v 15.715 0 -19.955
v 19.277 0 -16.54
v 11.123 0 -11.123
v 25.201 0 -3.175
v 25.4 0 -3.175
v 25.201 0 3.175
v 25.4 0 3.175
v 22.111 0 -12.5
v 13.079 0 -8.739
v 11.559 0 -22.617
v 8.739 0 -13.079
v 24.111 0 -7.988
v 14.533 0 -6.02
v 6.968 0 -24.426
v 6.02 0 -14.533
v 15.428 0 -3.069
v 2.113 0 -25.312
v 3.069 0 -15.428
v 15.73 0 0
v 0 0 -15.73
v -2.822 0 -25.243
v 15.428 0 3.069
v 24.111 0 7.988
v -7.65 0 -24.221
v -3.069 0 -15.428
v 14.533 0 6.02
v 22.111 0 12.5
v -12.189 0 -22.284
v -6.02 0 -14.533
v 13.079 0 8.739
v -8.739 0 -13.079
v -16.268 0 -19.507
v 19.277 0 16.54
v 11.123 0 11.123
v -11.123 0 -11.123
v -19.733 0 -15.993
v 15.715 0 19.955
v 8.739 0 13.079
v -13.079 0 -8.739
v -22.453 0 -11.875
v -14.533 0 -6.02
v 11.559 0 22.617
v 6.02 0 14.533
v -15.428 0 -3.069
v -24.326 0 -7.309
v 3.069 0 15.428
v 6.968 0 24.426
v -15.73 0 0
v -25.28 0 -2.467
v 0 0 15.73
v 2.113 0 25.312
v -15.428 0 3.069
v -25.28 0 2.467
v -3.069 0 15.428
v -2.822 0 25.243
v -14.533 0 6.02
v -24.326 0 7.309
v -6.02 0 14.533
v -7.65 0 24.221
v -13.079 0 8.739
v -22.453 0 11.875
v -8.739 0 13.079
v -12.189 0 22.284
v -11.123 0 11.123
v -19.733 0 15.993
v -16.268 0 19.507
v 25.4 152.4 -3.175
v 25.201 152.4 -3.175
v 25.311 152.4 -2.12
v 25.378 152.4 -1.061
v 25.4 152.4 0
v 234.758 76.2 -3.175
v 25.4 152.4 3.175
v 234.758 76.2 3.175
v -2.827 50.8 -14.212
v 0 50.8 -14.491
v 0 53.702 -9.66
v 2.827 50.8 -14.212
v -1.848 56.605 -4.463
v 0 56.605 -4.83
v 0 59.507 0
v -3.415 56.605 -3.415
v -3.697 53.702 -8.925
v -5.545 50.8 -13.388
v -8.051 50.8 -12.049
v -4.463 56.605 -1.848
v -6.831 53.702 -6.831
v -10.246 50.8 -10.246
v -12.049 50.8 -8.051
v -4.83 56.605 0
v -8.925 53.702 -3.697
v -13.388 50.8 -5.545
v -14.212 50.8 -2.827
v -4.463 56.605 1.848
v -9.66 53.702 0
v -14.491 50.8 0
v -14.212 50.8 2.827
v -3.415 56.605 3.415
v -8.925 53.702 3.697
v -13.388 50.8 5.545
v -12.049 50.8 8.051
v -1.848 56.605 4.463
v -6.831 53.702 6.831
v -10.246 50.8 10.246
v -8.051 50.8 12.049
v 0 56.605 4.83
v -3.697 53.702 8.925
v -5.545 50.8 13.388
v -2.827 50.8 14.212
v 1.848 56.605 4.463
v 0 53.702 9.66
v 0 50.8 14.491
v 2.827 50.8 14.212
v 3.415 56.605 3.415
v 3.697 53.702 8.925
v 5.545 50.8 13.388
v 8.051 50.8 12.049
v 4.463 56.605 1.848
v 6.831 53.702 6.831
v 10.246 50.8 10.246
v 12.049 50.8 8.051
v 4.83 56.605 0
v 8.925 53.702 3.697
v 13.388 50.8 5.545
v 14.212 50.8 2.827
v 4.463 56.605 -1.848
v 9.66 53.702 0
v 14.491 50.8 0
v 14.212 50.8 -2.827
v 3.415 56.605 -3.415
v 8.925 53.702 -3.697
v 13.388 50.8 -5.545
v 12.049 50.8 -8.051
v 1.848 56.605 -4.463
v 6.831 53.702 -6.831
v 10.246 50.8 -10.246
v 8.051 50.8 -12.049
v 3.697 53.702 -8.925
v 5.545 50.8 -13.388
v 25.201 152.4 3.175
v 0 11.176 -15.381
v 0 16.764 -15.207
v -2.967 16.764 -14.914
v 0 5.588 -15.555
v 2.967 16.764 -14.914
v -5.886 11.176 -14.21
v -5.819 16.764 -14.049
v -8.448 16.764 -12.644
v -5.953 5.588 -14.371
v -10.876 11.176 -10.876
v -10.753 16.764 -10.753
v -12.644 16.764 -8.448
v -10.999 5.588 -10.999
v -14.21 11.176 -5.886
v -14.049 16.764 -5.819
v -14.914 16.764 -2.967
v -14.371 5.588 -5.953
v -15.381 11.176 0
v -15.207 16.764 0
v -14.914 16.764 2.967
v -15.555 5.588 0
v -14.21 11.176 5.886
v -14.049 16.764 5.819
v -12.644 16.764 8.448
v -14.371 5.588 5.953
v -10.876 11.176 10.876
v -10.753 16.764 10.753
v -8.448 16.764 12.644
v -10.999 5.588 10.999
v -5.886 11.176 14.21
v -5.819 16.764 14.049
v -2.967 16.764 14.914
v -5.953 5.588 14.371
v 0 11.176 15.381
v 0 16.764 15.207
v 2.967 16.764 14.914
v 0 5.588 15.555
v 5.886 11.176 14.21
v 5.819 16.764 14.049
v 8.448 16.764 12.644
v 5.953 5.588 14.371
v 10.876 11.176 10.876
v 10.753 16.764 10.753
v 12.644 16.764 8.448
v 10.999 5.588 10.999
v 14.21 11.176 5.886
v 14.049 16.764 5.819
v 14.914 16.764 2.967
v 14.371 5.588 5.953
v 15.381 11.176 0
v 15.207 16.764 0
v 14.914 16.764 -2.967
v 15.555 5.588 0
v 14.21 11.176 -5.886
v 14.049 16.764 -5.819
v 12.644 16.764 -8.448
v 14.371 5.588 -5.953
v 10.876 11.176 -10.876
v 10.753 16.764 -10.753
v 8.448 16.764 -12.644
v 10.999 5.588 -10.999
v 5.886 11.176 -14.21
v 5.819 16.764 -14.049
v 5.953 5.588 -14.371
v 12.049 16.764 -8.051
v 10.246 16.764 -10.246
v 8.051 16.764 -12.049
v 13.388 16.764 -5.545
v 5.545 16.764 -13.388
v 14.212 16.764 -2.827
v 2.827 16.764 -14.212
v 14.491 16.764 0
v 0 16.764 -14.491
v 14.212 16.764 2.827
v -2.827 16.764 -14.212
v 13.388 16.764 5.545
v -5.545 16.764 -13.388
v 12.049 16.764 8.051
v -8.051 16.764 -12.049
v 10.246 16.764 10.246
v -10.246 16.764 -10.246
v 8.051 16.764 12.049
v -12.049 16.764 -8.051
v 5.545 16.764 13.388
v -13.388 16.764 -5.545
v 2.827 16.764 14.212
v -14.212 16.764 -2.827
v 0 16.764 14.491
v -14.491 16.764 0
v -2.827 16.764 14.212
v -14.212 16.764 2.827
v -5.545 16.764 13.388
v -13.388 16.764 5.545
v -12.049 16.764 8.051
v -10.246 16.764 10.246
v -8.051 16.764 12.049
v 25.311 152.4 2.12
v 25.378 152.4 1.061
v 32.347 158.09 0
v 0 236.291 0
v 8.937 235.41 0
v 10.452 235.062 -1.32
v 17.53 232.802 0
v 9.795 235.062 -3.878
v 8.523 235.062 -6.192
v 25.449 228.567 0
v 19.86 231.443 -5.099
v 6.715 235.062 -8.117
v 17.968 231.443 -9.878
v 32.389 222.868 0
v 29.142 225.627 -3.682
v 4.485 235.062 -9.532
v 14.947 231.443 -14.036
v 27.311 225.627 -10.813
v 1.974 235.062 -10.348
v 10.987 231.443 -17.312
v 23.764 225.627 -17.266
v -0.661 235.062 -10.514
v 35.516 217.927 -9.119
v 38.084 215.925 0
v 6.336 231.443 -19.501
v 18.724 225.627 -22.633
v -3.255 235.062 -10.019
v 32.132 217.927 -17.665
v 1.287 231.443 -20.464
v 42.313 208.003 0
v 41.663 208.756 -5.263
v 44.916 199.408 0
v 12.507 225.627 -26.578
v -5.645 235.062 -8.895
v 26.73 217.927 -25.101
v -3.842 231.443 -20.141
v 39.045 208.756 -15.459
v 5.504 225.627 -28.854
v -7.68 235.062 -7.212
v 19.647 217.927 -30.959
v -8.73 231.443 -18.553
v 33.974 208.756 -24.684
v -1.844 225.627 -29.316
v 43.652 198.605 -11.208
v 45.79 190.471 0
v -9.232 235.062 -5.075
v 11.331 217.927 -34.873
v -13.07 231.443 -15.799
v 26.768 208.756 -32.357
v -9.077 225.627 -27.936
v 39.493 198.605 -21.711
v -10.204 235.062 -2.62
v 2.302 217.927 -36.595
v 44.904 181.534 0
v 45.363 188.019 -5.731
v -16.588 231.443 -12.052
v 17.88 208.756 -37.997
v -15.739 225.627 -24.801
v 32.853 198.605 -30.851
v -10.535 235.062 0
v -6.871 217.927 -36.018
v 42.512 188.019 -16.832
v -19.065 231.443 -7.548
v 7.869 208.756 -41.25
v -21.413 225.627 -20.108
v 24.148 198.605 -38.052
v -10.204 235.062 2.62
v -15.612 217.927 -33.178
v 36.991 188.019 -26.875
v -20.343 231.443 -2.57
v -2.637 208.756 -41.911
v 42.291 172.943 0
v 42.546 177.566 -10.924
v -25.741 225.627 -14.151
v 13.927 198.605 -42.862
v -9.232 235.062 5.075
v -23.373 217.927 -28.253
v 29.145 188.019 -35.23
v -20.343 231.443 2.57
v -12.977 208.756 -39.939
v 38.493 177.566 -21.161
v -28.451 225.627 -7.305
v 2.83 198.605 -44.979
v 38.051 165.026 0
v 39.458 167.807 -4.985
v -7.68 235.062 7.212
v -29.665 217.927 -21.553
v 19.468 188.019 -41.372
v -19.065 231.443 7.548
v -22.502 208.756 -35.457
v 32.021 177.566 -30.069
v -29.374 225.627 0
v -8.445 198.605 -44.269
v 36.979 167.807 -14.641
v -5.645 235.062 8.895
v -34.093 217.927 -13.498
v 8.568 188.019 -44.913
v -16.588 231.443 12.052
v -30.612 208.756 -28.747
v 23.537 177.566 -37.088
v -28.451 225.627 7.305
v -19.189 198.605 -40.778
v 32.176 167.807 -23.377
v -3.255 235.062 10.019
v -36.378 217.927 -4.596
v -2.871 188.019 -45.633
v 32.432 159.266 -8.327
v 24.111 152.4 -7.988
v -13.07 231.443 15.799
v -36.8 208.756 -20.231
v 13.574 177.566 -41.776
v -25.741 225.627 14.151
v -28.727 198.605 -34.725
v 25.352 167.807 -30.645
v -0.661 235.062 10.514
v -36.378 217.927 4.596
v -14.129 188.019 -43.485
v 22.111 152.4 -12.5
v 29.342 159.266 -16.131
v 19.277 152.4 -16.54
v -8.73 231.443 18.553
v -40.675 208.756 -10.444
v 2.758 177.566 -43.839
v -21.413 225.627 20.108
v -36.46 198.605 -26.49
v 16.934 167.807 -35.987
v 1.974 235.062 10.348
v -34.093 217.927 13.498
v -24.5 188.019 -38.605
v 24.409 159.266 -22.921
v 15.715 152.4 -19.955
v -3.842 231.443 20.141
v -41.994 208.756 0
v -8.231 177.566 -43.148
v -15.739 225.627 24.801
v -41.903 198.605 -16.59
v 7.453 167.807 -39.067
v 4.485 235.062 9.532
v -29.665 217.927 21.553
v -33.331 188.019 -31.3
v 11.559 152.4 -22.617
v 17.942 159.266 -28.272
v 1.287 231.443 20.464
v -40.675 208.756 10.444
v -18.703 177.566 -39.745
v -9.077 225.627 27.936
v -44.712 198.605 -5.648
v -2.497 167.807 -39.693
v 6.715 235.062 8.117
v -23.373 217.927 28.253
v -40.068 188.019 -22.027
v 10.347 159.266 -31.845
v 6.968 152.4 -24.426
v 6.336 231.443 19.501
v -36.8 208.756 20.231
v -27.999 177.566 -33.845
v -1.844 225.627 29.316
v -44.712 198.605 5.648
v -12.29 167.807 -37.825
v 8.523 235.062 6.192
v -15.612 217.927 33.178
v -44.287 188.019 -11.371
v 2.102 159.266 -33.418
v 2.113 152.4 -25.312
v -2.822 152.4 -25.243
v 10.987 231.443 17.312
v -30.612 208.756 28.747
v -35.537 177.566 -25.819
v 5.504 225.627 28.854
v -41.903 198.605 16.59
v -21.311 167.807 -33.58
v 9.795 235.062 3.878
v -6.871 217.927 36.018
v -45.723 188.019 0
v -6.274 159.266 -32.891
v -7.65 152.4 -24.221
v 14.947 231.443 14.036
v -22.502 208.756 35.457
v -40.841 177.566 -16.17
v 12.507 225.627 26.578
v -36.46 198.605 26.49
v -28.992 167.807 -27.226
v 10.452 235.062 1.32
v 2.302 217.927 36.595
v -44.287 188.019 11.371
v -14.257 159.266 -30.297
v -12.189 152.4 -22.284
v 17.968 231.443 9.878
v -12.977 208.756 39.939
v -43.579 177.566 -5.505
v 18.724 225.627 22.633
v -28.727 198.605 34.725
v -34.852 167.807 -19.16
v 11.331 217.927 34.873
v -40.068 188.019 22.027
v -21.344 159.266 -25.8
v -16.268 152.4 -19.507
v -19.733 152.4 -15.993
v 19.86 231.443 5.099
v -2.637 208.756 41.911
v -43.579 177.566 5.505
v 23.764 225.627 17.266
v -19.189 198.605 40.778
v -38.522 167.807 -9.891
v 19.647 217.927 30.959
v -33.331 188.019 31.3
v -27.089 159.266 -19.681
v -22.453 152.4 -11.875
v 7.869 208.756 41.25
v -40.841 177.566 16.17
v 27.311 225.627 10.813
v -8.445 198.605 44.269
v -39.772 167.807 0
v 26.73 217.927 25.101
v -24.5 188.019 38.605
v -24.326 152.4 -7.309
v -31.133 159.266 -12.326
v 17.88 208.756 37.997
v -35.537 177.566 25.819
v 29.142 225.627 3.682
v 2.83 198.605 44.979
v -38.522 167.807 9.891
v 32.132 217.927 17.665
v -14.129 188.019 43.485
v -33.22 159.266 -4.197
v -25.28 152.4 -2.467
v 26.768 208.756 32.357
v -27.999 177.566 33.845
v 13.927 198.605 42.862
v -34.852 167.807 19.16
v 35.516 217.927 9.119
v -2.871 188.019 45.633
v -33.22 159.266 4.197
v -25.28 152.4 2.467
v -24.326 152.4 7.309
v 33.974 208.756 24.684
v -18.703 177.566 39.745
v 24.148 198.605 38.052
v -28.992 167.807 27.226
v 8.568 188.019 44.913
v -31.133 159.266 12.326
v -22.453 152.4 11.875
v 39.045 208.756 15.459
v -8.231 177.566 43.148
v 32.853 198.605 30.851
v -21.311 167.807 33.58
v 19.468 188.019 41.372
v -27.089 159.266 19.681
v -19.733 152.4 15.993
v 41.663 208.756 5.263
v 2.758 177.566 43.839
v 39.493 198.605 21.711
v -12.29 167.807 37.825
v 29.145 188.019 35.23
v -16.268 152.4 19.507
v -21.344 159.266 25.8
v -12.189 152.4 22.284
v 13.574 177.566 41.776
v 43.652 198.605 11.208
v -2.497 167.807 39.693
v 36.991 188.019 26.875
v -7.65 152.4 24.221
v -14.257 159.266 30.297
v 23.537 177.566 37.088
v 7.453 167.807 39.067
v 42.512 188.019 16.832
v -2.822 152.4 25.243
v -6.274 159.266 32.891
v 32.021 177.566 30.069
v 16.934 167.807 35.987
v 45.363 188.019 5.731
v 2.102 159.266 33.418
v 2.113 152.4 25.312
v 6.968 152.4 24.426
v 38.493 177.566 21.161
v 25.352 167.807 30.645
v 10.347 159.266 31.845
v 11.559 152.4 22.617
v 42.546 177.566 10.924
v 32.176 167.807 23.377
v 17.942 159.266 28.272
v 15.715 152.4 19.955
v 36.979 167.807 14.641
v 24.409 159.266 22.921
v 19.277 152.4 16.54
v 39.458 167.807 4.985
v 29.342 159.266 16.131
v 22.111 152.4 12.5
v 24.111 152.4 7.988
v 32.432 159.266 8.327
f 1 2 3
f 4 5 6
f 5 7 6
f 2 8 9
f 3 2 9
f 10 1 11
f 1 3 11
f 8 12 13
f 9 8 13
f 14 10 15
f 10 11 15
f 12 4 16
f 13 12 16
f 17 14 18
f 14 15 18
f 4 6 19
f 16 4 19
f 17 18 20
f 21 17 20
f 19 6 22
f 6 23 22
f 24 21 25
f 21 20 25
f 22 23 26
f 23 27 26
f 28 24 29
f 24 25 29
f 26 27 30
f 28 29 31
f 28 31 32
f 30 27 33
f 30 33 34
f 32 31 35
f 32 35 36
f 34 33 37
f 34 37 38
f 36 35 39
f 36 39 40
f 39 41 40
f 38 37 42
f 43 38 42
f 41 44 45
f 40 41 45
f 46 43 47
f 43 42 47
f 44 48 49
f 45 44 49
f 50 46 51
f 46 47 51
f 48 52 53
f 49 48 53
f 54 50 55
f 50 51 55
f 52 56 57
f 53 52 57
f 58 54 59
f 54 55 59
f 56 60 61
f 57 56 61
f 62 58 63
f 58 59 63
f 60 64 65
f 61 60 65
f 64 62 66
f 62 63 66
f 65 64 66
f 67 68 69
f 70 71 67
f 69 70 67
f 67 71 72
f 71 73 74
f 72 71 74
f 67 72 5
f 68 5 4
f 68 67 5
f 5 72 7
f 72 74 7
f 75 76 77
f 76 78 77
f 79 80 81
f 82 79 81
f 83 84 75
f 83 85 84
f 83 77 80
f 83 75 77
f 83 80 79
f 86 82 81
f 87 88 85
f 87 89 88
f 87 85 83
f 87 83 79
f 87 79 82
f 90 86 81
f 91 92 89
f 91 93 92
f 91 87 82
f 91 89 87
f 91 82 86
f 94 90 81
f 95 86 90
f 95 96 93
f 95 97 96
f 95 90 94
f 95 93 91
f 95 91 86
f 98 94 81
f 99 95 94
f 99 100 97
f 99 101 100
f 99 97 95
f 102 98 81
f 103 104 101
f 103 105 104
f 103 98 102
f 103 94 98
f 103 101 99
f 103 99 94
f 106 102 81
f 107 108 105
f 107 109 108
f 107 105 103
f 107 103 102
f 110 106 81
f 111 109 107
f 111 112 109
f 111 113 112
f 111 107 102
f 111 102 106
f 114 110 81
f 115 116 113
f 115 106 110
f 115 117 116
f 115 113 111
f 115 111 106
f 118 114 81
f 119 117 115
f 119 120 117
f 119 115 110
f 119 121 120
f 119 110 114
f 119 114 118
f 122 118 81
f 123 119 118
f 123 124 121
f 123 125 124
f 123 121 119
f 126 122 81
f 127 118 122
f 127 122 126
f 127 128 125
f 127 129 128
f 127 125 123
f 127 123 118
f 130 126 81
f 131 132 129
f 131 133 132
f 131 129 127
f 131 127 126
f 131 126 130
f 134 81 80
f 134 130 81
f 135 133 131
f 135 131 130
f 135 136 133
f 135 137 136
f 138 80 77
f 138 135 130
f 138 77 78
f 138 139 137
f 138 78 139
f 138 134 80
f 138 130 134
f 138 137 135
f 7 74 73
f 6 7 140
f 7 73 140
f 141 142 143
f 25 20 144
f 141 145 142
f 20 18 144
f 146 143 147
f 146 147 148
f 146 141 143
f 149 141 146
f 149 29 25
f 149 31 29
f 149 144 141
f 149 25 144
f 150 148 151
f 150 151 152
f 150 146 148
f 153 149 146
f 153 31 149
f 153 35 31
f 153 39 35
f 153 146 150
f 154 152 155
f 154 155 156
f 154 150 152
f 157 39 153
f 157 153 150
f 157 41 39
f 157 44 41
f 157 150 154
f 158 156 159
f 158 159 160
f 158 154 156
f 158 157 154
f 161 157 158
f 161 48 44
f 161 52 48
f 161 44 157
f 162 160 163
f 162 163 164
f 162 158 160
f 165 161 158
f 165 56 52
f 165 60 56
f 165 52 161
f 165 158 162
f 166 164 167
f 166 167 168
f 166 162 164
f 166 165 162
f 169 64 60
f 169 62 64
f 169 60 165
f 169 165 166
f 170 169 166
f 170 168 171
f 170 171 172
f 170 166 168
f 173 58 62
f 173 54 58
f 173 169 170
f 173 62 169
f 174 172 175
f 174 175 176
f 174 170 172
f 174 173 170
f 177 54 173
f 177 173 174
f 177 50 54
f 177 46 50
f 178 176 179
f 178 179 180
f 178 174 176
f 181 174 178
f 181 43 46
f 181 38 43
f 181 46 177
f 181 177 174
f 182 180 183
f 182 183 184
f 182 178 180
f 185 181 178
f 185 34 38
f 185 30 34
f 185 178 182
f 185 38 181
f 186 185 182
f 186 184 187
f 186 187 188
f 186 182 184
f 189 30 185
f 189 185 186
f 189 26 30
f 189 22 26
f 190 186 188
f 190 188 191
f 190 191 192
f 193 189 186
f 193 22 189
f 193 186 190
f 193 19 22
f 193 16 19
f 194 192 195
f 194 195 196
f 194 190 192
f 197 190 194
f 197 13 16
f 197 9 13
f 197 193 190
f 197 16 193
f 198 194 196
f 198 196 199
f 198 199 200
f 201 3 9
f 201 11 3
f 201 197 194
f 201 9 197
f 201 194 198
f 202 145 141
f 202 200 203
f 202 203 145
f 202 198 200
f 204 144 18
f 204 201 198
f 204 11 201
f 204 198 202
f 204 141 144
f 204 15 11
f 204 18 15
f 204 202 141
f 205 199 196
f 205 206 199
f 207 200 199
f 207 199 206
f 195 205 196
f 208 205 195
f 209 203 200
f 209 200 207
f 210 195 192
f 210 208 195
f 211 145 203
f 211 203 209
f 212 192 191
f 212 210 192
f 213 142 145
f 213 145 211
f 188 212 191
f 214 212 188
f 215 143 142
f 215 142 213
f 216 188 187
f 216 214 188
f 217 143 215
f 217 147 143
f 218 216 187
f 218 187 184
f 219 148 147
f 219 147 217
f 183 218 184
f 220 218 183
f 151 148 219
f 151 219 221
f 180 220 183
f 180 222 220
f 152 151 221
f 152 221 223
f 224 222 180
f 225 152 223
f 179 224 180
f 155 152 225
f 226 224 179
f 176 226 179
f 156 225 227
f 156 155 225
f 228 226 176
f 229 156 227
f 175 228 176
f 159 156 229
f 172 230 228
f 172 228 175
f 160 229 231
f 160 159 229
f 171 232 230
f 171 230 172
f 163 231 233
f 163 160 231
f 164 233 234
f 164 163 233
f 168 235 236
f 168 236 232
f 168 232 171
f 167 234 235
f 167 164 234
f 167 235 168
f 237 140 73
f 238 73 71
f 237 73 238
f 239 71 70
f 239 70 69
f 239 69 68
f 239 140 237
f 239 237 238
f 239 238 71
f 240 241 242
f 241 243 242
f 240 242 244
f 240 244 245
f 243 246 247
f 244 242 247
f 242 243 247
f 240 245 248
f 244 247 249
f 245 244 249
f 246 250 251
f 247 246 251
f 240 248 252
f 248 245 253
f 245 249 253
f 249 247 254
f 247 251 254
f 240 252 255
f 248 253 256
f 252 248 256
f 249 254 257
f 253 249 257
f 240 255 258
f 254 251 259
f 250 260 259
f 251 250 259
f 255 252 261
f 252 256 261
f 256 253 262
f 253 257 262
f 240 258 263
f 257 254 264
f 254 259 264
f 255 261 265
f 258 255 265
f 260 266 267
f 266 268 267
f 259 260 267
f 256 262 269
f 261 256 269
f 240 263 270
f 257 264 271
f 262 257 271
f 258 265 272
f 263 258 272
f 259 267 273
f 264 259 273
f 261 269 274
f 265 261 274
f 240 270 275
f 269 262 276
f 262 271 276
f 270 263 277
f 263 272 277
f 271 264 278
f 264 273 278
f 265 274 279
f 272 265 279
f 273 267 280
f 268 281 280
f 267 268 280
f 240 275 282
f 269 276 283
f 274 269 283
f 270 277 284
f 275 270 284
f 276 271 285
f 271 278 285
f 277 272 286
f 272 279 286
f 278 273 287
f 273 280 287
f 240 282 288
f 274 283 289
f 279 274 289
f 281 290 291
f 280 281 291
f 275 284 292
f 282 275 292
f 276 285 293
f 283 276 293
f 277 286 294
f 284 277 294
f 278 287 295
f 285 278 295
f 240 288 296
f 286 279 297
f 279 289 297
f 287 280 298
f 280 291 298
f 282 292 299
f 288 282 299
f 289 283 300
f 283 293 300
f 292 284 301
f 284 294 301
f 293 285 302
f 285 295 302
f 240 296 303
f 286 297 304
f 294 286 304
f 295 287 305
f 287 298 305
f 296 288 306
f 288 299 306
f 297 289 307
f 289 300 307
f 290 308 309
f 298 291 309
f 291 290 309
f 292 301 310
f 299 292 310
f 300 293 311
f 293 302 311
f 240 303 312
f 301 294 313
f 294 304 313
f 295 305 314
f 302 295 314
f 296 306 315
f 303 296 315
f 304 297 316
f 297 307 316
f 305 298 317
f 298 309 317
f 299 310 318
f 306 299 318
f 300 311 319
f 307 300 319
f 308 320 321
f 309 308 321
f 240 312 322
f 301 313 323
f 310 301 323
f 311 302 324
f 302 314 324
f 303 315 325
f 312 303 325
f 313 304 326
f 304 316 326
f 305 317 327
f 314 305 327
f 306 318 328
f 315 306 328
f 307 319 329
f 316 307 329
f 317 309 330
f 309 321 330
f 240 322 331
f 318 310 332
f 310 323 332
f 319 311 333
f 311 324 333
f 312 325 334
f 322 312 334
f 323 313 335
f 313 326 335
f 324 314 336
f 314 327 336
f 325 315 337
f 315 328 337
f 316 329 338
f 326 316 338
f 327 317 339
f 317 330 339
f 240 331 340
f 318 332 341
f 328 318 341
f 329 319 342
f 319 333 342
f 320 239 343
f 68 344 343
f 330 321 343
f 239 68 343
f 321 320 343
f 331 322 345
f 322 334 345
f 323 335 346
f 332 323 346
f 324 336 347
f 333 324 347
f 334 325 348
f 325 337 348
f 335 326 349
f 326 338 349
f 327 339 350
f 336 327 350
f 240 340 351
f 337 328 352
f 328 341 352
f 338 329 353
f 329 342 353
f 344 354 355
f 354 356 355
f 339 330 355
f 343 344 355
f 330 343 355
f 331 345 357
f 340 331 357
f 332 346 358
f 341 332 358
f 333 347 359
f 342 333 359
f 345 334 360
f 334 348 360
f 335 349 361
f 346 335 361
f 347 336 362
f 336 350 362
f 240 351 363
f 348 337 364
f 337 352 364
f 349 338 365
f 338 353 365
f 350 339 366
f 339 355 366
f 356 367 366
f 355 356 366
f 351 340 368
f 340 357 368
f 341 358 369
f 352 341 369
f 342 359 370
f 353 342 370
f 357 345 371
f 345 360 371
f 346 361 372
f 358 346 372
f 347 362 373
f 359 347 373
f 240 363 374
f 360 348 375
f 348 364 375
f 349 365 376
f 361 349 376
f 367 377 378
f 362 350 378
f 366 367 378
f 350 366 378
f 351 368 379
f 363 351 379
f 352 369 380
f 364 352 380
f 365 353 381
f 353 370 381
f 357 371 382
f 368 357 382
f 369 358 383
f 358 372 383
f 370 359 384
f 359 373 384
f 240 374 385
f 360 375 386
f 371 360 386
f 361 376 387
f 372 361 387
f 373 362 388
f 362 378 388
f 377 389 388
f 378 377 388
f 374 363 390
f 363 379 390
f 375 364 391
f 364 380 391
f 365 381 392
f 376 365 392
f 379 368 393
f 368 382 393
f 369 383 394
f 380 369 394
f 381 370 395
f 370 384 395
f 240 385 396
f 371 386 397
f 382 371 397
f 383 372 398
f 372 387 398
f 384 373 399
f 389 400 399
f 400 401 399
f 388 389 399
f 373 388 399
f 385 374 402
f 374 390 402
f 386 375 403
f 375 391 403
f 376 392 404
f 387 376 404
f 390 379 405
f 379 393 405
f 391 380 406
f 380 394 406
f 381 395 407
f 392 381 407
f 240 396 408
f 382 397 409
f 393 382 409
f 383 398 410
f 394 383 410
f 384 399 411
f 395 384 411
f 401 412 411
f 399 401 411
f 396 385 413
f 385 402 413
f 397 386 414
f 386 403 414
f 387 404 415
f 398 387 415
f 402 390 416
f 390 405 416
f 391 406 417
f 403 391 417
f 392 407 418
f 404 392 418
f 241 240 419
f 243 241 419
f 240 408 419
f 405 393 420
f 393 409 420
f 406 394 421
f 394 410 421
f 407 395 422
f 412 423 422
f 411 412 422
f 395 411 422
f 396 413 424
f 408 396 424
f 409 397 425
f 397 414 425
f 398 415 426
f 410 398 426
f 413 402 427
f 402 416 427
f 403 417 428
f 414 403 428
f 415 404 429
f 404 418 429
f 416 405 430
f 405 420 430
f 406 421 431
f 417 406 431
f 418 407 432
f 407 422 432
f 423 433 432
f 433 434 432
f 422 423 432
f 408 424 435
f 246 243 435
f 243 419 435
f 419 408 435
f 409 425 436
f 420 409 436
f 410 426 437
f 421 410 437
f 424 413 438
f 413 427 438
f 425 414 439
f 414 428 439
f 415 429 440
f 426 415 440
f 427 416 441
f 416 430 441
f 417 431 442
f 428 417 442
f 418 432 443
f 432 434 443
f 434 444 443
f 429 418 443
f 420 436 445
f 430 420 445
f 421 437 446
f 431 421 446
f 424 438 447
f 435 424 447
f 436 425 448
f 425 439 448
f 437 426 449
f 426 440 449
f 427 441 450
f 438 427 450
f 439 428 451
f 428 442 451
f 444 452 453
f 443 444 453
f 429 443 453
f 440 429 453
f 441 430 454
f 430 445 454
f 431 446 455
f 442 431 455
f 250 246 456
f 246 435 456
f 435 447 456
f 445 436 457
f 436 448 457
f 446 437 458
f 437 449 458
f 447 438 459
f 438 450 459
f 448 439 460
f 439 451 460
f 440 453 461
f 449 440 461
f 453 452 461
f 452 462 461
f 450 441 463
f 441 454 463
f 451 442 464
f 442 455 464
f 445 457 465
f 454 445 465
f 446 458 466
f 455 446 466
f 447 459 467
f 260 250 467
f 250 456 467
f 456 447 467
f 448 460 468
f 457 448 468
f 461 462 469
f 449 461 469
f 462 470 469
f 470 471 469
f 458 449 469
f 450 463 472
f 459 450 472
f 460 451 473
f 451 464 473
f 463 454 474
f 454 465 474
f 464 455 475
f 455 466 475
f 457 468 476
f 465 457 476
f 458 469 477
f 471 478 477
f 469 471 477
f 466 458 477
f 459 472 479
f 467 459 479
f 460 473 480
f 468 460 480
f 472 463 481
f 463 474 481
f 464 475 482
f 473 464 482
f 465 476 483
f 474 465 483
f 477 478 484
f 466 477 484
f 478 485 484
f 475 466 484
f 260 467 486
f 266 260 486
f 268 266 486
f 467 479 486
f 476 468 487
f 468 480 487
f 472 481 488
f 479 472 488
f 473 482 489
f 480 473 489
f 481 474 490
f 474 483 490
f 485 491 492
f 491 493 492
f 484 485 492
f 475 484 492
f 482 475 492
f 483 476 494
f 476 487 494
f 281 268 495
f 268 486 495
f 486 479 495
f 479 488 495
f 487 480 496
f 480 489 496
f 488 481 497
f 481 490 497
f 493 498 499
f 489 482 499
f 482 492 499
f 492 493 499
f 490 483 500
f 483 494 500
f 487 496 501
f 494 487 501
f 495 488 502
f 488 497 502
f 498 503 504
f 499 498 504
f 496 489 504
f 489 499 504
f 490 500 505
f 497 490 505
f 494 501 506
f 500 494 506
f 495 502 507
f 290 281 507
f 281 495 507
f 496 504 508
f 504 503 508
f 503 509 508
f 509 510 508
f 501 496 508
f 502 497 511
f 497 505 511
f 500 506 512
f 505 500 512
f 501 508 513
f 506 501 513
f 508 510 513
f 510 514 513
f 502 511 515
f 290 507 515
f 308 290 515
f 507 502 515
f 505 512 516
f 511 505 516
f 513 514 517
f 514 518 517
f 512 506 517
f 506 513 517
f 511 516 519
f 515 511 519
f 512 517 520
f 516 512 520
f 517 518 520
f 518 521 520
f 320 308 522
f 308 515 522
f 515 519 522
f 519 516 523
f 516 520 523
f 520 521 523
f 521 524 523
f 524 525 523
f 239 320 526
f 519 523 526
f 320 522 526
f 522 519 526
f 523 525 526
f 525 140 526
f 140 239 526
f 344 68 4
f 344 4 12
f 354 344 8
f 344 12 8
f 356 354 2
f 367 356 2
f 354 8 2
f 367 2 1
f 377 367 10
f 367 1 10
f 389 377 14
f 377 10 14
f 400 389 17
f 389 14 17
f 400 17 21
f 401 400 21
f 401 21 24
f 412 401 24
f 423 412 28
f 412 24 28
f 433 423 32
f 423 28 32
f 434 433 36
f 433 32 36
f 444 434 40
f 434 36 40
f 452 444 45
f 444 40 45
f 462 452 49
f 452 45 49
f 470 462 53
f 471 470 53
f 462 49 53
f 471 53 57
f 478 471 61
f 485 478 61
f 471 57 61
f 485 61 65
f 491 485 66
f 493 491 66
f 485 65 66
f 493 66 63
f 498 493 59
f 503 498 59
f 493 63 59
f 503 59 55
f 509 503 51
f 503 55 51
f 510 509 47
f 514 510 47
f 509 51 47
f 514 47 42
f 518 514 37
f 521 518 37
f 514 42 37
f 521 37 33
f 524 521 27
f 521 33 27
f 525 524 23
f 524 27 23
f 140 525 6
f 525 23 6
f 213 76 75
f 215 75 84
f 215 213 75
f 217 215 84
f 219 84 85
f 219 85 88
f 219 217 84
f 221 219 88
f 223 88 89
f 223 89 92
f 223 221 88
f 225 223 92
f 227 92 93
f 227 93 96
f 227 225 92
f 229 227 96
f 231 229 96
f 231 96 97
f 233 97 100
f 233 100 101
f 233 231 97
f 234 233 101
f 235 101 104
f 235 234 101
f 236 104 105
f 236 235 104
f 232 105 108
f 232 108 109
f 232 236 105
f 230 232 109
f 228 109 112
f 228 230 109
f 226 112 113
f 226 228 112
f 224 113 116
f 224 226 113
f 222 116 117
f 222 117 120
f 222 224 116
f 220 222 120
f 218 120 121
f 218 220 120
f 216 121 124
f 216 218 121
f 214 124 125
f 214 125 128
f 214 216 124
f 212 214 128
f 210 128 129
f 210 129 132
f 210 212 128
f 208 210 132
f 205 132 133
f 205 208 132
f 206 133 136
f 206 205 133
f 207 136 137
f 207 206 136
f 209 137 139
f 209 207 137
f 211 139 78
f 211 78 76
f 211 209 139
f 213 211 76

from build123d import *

# Parameters (mm, degrees)
SKETCH2_R           = 25.4
BOSS_EXTRUDE1_DEPTH = 152.4
BOSS_EXTRUDE2_DEPTH = 3.175


with BuildPart() as part:
    # Sketch2 → Boss-Extrude1 (new body)
    with BuildSketch(Plane(origin=(0, 0, 0), x_dir=(1, 0, 0), z_dir=(0, 1, 0))):
        with Locations(Location((0, 0, 0), (0, 0, 90))):
            Circle(SKETCH2_R)
    extrude(amount=BOSS_EXTRUDE1_DEPTH)

    # Sketch5 → 1 NPT Tapped Hole1 (revolve, cut)
    with BuildSketch(Plane(origin=(0, 0, 0), x_dir=(0, 0, -1), z_dir=(1, 0, 0))):
        Polygon((0, 0), (0, 59.506890972), (14.4907, 50.8), (14.4907, 16.764), (15.206530434, 16.764), (15.7298898, 0), align=None)
    revolve(axis=Axis((0, -6.35, 0), (0, 1, 0)), mode=Mode.SUBTRACT)



with BuildPart() as body_2:
    # Sketch7 → Boss-Extrude2 (new, symmetric)
    with BuildSketch(Plane.XY):
        Polygon((25.4, 152.4), (234.757779362, 76.2), (25.4, 0), (20.492740143, 0), (20.492740143, 152.4), align=None)
    extrude(amount=BOSS_EXTRUDE2_DEPTH, both=True)


with BuildPart() as part_1:
    add(part.part)

    add(body_2.part)  # Revolve1 merges body 2
    # Sketch8 → Revolve1 (revolve)
    with BuildSketch(Plane.XY):
        with BuildLine():
            Line((25.4, 152.4), (0, 152.4))
            Line((0, 152.4), (0, 236.290501198))
            ThreePointArc((0, 236.290501198), (43.825723586, 203.769361408), (25.4, 152.4))
        make_face()
    revolve(axis=Axis((0, 152.4, 0), (0, 1, 0)))


solid = part_1.part
